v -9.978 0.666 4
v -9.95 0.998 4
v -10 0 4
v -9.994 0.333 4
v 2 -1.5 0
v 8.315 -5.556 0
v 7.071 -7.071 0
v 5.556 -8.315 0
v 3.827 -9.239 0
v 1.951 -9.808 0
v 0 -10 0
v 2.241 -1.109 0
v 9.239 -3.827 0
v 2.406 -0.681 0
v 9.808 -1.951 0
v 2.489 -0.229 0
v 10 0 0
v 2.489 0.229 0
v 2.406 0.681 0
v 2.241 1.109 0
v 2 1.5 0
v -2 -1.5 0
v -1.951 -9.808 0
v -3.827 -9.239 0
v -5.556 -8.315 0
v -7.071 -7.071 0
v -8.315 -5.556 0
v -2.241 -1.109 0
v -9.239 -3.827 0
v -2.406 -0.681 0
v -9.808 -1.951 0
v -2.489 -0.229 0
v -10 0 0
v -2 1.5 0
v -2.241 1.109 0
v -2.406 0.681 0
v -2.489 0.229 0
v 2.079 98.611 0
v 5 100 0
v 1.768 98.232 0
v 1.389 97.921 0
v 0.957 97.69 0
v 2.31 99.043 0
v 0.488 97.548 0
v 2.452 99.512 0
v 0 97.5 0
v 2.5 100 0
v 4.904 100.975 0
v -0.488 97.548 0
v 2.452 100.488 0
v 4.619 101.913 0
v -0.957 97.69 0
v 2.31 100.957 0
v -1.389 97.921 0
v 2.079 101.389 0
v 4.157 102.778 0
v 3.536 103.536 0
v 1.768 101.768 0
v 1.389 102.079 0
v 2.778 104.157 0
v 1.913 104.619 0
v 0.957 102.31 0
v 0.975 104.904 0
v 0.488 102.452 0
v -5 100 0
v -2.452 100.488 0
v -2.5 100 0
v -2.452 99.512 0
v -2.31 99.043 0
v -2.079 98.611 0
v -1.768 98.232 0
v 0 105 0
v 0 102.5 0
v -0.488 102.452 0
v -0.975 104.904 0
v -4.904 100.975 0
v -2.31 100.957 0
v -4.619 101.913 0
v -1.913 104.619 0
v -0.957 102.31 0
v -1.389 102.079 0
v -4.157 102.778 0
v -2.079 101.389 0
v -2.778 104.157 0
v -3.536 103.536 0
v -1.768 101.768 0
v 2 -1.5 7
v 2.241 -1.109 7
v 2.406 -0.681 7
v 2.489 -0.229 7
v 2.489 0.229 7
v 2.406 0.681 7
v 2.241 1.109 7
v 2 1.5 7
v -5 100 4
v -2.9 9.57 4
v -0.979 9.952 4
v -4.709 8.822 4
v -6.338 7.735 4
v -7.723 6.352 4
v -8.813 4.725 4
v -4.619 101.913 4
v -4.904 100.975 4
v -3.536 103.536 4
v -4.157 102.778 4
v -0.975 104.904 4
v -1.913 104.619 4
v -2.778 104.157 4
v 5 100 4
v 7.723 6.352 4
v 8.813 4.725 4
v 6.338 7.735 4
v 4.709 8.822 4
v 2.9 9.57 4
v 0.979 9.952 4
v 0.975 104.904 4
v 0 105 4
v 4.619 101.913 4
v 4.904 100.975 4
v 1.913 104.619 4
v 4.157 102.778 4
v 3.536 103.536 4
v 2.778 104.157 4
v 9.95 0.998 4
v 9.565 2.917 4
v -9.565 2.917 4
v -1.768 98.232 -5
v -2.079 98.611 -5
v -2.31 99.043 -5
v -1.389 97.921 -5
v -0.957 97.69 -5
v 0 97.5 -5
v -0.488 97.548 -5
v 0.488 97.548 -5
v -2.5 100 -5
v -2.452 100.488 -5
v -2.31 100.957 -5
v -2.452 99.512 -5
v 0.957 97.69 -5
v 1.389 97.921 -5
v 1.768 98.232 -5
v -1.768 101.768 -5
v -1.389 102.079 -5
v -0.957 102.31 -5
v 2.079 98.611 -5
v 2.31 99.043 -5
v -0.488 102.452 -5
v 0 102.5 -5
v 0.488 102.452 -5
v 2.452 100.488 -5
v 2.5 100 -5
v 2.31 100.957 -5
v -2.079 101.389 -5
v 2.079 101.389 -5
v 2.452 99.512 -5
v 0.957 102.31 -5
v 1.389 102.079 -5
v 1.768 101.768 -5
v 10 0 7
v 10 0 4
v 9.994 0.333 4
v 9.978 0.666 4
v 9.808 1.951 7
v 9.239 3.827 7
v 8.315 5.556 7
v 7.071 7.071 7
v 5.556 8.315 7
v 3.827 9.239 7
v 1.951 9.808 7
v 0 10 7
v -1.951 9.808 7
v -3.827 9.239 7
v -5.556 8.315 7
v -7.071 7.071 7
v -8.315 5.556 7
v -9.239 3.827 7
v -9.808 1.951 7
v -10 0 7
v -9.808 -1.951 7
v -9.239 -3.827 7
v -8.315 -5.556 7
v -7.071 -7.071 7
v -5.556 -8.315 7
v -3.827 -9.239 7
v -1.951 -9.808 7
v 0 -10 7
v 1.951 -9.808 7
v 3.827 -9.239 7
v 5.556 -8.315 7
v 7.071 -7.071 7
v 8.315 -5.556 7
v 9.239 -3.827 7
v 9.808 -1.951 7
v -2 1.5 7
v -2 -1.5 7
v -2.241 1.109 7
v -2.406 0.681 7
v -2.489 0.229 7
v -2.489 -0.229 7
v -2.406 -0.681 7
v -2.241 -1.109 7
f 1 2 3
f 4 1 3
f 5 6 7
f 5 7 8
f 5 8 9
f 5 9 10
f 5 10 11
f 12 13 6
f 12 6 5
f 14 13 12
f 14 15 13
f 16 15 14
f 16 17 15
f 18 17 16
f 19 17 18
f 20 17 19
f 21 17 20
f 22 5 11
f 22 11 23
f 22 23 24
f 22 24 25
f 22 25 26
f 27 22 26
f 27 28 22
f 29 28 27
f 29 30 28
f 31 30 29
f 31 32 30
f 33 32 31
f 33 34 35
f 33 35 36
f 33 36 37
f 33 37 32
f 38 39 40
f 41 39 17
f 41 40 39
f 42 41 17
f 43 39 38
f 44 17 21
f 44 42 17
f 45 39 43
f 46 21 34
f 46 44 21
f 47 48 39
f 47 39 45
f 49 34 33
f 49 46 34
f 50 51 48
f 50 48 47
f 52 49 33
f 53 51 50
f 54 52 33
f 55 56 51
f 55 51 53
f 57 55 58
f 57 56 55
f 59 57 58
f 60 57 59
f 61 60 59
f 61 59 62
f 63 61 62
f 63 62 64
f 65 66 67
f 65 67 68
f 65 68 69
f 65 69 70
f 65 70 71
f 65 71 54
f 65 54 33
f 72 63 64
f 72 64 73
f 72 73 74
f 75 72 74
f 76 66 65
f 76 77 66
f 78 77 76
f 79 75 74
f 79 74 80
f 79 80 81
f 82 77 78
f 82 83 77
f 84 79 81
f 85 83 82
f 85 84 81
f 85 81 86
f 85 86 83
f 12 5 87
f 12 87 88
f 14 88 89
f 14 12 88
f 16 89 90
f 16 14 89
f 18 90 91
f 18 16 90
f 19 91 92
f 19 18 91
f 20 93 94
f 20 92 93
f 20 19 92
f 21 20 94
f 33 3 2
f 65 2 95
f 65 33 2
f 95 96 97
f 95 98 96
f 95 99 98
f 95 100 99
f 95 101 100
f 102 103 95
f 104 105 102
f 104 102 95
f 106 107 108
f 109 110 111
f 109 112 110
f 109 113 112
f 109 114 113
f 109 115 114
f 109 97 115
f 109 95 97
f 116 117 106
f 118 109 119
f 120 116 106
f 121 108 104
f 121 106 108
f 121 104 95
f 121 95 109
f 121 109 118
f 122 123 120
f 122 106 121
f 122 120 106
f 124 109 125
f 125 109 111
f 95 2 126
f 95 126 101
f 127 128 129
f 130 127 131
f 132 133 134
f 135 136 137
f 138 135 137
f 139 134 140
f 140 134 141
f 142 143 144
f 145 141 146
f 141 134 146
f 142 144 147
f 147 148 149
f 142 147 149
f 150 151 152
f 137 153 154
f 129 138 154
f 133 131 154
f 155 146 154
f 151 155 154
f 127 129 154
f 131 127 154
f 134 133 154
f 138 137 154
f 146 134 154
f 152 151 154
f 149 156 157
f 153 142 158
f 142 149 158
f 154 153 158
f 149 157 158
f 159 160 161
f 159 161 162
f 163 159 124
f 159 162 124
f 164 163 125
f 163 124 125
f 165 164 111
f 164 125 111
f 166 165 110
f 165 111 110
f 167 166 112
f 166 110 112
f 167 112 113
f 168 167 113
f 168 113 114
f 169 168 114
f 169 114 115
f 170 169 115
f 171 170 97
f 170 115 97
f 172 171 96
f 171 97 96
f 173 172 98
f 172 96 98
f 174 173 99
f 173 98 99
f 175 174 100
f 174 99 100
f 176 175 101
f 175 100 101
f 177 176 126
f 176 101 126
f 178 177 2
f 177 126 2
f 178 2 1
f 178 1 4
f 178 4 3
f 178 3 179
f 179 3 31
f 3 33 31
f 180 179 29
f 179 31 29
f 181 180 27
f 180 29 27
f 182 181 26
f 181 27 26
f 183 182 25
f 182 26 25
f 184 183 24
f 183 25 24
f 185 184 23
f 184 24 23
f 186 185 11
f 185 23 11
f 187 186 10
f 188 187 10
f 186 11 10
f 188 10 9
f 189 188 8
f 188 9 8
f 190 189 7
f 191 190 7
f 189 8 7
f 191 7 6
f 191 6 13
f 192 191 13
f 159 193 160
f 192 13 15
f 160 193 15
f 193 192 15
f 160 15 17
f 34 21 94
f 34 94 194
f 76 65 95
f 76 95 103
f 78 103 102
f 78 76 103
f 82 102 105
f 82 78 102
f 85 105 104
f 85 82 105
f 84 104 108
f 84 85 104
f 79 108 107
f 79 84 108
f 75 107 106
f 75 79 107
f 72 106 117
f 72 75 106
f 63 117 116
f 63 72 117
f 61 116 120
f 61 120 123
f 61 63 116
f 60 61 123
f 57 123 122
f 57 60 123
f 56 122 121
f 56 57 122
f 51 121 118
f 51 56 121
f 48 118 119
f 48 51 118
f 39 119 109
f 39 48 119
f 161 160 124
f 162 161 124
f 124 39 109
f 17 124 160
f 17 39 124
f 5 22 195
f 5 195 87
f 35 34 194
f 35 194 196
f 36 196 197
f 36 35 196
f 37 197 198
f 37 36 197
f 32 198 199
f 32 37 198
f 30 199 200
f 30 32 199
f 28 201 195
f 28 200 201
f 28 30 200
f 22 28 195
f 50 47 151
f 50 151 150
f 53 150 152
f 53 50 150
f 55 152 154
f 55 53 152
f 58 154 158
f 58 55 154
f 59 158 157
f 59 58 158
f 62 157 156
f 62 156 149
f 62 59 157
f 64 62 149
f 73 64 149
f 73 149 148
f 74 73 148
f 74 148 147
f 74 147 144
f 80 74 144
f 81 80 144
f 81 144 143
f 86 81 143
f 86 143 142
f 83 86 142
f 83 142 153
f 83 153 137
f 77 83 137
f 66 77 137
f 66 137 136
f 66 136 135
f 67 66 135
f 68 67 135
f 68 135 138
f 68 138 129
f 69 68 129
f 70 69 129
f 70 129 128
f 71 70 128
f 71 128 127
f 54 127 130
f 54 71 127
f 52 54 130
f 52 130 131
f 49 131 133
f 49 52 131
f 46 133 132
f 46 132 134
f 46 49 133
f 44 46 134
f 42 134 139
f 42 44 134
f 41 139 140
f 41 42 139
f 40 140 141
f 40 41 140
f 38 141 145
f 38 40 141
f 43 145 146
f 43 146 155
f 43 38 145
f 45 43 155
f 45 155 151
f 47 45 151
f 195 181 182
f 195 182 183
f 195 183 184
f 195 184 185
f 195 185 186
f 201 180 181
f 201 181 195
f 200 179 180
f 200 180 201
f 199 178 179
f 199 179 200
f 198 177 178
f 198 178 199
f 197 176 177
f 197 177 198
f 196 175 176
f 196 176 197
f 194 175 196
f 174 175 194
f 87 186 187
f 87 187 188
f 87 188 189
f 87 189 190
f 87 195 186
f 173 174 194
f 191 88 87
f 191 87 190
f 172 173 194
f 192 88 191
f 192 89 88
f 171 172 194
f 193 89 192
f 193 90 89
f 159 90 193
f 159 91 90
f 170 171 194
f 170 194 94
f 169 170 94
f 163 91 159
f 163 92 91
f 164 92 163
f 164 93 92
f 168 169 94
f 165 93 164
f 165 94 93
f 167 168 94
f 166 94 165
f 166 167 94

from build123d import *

# Parameters (mm, degrees)
BOSS_EXTRUDE1_DEPTH = 4
SKETCH4_R           = 10
BOSS_EXTRUDE2_DEPTH = 3
CUT_EXTRUDE3_DEPTH  = 11
SKETCH5_R           = 2.5
BOSS_EXTRUDE4_DEPTH = 9


with BuildPart() as part:
    # Sketch3 → Boss-Extrude1 (new body)
    with BuildSketch(Plane.XY):
        with BuildLine():
            Line((-10, 0), (-5, 100))
            ThreePointArc((-5, 100), (0, 105), (5, 100))
            Line((5, 100), (10, 0))
            ThreePointArc((10, 0), (0, -10), (-10, 0))
        make_face()
    extrude(amount=BOSS_EXTRUDE1_DEPTH)

    # Sketch4 → Boss-Extrude2 (add)
    with BuildSketch(Plane.XY.offset(4)):
        Circle(SKETCH4_R)
    extrude(amount=BOSS_EXTRUDE2_DEPTH)

    # Sketch2 → Cut-Extrude3 (cut)
    with BuildSketch(Plane.XY):
        with BuildLine():
            Line((-2, -1.5), (2, -1.5))
            ThreePointArc((2, -1.5), (2.5, 0), (2, 1.5))
            Line((2, 1.5), (-2, 1.5))
            ThreePointArc((-2, 1.5), (-2.5, 0), (-2, -1.5))
        make_face()
    extrude(amount=CUT_EXTRUDE3_DEPTH, mode=Mode.SUBTRACT)

    # Sketch5 → Boss-Extrude4 (add)
    with BuildSketch(Plane.XY.offset(4)):
        with Locations((0, 100)):
            Circle(SKETCH5_R)
    extrude(amount=-BOSS_EXTRUDE4_DEPTH)


solid = part.part
